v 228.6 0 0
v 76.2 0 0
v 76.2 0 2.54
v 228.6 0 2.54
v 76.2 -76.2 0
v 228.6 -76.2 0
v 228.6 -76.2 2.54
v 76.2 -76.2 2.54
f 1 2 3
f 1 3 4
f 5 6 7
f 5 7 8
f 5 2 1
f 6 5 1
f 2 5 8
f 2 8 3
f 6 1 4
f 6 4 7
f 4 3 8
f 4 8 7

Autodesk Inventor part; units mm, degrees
ref_plane "YZ Plane" through (0, 0, 0) normal (1, 0, 0) x (0, 1, 0)
ref_plane "XZ Plane" through (0, 0, 0) normal (0, 1, 0) x (-1, 0, 0)
ref_plane "XY Plane" through (0, 0, 0) normal (0, 0, 1) x (1, 0, 0)
sketch "Sketch1" plane through (0, 0, 0) normal (0, 0, 1) x (1, 0, 0)
  line L0 (0, 0) -> (228.6, 0)
  line L1 (228.6, 0) -> (228.6, -76.2)
  line L2 (228.6, -76.2) -> (0, -76.2)
  line L3 (0, -76.2) -> (0, 0)
  dimension "d0" = 228.6
  dimension "d1" = 76.2
extrude "Extrusion1" add sketch "Sketch1" along normal blind 2.54
sketch "Sketch2" plane through (0, 0, 2.54) normal (0, 0, 1) x (1, 0, 0)
  point P0 (0, 0)
move faces "Move1" translate (76.2, 0, 0) faces at (0, -50.8, 0.8467)
hole "Hole1" at (0, 0, 2.54) direction (0, 0, -1) diameter 6.35 end through all
properties part number "Bopper"
